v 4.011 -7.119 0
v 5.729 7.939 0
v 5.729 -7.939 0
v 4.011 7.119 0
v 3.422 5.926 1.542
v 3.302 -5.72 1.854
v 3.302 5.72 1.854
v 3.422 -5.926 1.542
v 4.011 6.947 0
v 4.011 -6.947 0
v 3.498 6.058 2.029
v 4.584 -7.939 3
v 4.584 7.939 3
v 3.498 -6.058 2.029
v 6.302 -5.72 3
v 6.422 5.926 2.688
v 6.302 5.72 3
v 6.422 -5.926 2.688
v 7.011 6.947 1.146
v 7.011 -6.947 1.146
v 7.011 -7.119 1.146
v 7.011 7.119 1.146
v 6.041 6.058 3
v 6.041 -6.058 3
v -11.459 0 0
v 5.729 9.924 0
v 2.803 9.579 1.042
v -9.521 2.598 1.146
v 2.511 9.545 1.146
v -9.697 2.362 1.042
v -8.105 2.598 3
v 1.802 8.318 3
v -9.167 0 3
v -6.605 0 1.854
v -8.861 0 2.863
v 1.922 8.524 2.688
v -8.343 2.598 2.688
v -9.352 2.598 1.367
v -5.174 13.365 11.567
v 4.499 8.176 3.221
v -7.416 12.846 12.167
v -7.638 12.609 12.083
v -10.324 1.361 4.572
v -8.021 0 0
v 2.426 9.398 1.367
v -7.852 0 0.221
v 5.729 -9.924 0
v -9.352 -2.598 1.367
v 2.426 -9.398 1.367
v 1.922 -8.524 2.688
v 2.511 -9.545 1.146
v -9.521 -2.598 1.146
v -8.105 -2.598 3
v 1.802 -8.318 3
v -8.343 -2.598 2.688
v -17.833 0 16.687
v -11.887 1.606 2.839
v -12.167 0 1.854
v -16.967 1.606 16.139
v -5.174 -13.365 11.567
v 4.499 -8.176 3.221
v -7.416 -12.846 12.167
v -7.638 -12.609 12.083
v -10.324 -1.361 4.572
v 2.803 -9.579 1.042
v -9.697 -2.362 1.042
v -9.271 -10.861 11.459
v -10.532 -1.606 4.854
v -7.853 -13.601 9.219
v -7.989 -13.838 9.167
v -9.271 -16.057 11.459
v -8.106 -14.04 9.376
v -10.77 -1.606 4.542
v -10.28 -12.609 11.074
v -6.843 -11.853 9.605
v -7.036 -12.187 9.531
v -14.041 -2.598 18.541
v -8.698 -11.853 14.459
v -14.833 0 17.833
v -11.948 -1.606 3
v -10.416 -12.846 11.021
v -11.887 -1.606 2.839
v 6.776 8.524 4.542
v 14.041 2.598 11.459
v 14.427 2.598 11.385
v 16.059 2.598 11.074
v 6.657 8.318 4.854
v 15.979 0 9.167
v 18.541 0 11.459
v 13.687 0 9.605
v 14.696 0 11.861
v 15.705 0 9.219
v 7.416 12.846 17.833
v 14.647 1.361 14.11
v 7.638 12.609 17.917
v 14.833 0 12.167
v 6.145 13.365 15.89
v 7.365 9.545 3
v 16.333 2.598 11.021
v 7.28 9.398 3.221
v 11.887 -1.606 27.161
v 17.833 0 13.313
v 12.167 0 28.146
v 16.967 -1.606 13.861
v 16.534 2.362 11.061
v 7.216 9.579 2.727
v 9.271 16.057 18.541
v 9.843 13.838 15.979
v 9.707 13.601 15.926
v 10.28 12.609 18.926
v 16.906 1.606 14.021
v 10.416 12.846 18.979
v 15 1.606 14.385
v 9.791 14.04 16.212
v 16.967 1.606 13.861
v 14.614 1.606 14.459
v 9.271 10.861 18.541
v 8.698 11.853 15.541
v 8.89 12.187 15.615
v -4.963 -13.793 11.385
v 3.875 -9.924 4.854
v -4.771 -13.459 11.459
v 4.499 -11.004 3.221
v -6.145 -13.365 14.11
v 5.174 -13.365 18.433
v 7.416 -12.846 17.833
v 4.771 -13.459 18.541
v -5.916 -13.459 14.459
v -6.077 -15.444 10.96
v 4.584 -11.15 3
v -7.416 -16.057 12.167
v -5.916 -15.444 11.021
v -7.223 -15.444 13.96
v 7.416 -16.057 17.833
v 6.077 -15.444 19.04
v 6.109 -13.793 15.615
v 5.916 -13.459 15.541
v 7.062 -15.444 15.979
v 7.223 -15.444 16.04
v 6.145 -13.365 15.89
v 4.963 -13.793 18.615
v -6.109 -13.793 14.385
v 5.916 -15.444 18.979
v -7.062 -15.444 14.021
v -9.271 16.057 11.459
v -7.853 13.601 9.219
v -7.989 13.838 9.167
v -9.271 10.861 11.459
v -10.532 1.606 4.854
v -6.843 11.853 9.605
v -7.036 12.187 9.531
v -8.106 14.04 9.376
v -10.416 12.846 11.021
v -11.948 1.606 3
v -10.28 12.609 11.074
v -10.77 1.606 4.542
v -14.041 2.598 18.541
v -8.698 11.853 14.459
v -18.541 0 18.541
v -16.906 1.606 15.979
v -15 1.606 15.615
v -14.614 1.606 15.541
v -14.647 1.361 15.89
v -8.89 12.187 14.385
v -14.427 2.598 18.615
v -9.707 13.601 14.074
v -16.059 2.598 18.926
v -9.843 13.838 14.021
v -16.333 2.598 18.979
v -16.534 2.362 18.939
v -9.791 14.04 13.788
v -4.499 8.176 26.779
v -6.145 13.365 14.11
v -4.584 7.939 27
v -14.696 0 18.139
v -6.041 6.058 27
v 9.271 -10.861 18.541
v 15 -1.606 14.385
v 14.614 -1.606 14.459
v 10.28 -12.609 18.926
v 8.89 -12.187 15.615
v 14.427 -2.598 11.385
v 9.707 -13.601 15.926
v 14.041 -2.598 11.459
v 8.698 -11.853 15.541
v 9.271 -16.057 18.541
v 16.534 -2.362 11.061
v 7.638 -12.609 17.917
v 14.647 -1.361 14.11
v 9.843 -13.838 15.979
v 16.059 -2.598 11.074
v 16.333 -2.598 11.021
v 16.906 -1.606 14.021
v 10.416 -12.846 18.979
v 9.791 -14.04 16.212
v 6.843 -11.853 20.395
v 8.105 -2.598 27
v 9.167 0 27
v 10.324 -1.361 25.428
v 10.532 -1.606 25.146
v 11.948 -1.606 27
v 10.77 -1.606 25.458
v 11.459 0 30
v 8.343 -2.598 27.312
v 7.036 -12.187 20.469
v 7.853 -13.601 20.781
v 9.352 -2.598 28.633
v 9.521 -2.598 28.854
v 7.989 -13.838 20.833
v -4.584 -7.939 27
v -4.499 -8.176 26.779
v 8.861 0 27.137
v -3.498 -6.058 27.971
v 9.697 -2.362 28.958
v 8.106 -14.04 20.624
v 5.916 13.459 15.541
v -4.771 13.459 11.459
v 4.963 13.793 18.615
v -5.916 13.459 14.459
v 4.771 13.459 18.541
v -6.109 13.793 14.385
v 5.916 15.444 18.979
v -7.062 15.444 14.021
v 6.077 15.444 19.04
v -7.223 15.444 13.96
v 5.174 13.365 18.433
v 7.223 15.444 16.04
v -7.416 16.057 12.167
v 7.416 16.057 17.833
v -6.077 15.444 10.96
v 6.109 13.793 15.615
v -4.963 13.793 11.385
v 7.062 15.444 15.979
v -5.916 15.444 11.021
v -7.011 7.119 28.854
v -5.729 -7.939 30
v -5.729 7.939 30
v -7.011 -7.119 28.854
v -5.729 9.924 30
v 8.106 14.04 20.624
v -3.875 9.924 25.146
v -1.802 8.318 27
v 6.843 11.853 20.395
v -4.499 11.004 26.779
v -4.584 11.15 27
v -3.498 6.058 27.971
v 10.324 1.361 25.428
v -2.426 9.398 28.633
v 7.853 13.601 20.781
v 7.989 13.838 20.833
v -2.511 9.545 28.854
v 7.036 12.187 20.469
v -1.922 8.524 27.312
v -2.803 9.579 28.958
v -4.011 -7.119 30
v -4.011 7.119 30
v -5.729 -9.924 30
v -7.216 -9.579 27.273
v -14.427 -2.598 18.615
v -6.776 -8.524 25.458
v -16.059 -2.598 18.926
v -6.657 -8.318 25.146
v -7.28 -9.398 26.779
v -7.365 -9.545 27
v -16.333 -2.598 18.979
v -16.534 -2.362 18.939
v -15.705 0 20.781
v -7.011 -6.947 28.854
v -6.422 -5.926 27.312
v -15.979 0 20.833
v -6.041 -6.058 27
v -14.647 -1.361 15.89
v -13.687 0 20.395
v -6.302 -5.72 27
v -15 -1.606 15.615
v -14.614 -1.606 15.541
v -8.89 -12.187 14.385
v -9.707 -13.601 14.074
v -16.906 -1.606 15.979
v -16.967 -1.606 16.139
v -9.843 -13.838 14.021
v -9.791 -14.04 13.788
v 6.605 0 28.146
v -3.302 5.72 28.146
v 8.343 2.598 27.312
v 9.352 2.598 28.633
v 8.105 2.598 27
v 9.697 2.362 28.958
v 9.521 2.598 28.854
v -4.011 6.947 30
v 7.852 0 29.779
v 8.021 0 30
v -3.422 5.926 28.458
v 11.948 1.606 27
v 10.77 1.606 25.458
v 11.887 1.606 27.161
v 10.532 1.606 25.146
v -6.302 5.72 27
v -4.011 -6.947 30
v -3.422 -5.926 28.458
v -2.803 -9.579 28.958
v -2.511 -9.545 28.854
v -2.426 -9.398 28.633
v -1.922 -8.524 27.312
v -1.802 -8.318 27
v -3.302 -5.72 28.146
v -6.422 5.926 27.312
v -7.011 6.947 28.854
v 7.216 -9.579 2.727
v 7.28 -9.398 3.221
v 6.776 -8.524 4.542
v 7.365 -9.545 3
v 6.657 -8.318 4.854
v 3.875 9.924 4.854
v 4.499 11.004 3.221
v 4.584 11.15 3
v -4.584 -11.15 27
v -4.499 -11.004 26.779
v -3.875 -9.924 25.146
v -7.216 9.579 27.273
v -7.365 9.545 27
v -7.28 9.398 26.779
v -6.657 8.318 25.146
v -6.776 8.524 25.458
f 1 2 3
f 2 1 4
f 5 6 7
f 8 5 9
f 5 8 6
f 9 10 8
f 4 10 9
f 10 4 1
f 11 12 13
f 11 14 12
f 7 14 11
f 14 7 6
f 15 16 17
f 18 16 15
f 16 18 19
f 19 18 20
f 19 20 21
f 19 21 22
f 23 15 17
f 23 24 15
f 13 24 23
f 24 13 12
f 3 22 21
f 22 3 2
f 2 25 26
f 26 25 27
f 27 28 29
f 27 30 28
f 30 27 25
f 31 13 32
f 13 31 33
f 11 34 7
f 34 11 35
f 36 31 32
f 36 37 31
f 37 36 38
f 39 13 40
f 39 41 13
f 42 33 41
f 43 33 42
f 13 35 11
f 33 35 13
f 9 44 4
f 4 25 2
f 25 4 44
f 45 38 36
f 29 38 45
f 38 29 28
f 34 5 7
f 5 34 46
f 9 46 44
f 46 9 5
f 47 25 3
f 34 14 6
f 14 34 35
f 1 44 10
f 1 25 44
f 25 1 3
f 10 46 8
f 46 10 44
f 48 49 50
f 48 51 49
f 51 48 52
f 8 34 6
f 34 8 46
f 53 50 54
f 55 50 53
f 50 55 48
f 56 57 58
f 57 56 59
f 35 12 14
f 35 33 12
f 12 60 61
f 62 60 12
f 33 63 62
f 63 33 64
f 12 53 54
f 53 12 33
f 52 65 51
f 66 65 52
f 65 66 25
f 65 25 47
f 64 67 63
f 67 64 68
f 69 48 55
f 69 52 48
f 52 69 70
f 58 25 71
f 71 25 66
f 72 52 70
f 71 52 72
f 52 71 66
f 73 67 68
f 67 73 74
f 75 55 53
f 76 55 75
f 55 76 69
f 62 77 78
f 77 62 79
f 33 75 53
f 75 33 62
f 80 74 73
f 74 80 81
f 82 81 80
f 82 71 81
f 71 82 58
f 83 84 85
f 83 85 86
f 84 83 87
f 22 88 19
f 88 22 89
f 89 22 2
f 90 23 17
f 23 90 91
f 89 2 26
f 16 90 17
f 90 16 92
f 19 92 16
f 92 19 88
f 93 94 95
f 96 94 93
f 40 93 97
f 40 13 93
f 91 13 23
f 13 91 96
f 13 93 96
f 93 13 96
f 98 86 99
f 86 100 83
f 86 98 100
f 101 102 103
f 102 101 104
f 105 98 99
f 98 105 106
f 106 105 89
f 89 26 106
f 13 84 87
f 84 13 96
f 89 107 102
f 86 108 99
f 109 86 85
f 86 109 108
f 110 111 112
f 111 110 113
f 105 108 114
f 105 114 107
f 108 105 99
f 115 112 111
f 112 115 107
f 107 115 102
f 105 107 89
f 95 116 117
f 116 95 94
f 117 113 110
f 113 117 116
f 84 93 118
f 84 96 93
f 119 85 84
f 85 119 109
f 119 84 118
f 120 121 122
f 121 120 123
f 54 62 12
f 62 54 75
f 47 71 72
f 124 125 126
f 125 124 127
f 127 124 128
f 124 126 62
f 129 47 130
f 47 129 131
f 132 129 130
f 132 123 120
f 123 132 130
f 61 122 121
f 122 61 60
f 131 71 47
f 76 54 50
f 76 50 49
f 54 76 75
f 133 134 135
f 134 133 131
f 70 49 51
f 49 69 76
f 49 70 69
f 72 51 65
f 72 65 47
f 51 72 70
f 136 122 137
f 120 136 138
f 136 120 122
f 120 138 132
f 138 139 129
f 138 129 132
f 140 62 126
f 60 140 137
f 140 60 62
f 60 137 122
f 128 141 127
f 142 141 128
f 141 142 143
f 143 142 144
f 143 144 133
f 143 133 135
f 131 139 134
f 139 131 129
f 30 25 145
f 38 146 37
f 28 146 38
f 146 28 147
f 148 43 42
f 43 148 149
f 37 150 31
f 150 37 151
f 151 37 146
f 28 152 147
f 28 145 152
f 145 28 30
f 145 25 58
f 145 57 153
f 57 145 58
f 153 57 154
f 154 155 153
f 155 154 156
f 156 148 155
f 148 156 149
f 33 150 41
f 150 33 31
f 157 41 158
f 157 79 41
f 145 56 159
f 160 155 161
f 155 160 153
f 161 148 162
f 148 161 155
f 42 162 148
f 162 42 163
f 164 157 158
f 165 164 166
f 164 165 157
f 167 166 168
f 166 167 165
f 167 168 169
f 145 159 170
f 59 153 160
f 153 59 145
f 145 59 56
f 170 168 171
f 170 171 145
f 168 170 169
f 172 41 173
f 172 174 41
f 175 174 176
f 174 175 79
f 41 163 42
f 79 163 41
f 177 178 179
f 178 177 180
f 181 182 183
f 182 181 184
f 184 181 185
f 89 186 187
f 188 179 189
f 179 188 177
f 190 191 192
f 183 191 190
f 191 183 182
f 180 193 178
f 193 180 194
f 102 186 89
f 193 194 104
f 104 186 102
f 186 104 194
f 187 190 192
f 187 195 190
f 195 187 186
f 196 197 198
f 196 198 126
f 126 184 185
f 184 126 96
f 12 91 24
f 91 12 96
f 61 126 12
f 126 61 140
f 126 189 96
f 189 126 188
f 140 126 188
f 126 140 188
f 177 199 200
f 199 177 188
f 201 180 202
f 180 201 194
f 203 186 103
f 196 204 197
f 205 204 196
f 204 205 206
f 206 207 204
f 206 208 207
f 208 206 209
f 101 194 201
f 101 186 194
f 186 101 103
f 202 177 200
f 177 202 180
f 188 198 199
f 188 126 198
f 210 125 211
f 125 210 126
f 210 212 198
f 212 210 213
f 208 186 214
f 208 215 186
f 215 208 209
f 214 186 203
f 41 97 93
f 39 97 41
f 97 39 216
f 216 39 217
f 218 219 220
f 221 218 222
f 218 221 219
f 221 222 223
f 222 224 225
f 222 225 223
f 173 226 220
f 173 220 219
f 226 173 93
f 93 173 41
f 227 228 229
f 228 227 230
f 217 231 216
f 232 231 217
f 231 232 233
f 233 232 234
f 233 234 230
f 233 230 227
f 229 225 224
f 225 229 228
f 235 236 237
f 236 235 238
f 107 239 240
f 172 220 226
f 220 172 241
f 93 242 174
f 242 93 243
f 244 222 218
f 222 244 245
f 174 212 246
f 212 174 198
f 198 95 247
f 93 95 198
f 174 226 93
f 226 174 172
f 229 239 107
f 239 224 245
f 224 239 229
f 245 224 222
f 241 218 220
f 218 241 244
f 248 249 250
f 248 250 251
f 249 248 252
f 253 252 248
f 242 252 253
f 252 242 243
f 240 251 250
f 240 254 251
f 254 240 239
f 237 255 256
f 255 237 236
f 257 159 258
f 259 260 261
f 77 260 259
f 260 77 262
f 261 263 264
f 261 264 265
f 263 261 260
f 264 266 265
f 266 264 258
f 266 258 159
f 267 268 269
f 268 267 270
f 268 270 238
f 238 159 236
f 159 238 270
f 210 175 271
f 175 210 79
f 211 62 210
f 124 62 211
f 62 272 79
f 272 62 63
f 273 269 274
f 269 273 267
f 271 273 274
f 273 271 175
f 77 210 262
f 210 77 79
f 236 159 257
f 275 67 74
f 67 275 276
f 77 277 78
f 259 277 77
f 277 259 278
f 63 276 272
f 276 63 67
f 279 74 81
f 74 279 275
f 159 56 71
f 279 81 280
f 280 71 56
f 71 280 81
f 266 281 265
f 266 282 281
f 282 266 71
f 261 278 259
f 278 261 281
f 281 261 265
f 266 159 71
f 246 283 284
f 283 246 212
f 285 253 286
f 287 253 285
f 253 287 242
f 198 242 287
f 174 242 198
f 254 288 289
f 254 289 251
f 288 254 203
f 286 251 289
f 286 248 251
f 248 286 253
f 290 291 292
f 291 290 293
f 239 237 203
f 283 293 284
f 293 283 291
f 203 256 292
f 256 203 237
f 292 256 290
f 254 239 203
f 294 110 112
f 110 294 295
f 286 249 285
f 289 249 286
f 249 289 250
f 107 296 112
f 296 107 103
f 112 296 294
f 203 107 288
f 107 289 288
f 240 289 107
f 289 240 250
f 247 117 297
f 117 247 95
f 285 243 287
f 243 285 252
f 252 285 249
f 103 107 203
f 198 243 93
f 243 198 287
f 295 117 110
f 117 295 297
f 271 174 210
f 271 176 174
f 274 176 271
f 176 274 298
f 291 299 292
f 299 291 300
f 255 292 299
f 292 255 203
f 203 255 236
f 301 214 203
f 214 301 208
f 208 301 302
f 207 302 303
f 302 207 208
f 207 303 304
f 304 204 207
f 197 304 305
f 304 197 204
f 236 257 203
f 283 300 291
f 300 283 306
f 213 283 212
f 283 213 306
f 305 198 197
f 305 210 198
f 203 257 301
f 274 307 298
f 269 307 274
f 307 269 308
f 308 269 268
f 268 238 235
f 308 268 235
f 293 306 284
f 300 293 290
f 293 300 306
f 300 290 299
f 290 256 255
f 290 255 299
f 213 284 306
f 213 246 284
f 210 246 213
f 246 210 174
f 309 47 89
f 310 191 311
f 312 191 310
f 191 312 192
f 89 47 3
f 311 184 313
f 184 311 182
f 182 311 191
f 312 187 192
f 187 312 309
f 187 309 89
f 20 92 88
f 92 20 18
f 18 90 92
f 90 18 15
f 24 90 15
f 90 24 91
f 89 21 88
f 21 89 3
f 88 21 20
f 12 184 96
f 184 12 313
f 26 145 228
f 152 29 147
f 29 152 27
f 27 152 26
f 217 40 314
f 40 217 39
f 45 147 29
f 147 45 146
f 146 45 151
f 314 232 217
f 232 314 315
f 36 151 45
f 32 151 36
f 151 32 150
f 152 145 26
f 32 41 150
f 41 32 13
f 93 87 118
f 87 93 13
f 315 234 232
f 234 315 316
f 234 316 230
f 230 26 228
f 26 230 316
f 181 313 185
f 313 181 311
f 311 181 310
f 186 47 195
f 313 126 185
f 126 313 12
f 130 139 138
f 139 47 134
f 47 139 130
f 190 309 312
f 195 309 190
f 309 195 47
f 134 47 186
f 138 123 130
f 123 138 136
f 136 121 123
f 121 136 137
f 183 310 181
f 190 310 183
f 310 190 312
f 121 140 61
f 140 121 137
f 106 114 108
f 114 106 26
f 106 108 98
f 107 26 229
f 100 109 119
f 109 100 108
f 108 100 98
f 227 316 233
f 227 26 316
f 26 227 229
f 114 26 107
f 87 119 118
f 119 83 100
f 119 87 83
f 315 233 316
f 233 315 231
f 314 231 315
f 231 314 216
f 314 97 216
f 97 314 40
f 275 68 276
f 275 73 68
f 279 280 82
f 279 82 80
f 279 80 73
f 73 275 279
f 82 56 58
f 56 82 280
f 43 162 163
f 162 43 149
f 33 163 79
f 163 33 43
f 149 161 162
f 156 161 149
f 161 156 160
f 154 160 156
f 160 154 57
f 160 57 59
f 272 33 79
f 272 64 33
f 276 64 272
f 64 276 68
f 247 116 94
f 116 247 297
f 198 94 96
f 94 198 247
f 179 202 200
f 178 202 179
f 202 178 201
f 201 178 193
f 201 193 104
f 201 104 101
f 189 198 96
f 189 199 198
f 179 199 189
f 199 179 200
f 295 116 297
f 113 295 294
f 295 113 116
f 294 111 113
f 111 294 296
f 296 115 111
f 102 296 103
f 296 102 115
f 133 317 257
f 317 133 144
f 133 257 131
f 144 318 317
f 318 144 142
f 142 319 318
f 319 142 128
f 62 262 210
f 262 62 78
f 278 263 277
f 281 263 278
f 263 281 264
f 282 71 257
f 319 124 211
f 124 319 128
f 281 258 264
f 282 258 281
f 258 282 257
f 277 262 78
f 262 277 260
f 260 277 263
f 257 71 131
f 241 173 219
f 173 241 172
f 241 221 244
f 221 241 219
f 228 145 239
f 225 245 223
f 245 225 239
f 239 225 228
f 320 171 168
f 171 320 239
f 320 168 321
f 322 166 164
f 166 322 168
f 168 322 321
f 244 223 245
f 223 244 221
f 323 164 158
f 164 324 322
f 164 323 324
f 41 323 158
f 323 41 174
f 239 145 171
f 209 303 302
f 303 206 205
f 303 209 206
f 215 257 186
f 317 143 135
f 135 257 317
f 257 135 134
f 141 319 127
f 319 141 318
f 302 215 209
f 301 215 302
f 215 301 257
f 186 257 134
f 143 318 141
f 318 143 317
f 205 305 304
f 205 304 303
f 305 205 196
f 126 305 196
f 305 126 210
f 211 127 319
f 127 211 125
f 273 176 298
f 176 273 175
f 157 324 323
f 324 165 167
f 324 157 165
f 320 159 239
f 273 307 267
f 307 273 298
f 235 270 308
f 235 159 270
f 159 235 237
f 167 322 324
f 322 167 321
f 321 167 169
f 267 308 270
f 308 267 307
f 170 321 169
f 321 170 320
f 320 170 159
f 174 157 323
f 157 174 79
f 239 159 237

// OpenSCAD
// shape height
sh = 30;
// border width
bw = 3;

include <../polyhedra.scad>;

poly_wire(icosahedron);
